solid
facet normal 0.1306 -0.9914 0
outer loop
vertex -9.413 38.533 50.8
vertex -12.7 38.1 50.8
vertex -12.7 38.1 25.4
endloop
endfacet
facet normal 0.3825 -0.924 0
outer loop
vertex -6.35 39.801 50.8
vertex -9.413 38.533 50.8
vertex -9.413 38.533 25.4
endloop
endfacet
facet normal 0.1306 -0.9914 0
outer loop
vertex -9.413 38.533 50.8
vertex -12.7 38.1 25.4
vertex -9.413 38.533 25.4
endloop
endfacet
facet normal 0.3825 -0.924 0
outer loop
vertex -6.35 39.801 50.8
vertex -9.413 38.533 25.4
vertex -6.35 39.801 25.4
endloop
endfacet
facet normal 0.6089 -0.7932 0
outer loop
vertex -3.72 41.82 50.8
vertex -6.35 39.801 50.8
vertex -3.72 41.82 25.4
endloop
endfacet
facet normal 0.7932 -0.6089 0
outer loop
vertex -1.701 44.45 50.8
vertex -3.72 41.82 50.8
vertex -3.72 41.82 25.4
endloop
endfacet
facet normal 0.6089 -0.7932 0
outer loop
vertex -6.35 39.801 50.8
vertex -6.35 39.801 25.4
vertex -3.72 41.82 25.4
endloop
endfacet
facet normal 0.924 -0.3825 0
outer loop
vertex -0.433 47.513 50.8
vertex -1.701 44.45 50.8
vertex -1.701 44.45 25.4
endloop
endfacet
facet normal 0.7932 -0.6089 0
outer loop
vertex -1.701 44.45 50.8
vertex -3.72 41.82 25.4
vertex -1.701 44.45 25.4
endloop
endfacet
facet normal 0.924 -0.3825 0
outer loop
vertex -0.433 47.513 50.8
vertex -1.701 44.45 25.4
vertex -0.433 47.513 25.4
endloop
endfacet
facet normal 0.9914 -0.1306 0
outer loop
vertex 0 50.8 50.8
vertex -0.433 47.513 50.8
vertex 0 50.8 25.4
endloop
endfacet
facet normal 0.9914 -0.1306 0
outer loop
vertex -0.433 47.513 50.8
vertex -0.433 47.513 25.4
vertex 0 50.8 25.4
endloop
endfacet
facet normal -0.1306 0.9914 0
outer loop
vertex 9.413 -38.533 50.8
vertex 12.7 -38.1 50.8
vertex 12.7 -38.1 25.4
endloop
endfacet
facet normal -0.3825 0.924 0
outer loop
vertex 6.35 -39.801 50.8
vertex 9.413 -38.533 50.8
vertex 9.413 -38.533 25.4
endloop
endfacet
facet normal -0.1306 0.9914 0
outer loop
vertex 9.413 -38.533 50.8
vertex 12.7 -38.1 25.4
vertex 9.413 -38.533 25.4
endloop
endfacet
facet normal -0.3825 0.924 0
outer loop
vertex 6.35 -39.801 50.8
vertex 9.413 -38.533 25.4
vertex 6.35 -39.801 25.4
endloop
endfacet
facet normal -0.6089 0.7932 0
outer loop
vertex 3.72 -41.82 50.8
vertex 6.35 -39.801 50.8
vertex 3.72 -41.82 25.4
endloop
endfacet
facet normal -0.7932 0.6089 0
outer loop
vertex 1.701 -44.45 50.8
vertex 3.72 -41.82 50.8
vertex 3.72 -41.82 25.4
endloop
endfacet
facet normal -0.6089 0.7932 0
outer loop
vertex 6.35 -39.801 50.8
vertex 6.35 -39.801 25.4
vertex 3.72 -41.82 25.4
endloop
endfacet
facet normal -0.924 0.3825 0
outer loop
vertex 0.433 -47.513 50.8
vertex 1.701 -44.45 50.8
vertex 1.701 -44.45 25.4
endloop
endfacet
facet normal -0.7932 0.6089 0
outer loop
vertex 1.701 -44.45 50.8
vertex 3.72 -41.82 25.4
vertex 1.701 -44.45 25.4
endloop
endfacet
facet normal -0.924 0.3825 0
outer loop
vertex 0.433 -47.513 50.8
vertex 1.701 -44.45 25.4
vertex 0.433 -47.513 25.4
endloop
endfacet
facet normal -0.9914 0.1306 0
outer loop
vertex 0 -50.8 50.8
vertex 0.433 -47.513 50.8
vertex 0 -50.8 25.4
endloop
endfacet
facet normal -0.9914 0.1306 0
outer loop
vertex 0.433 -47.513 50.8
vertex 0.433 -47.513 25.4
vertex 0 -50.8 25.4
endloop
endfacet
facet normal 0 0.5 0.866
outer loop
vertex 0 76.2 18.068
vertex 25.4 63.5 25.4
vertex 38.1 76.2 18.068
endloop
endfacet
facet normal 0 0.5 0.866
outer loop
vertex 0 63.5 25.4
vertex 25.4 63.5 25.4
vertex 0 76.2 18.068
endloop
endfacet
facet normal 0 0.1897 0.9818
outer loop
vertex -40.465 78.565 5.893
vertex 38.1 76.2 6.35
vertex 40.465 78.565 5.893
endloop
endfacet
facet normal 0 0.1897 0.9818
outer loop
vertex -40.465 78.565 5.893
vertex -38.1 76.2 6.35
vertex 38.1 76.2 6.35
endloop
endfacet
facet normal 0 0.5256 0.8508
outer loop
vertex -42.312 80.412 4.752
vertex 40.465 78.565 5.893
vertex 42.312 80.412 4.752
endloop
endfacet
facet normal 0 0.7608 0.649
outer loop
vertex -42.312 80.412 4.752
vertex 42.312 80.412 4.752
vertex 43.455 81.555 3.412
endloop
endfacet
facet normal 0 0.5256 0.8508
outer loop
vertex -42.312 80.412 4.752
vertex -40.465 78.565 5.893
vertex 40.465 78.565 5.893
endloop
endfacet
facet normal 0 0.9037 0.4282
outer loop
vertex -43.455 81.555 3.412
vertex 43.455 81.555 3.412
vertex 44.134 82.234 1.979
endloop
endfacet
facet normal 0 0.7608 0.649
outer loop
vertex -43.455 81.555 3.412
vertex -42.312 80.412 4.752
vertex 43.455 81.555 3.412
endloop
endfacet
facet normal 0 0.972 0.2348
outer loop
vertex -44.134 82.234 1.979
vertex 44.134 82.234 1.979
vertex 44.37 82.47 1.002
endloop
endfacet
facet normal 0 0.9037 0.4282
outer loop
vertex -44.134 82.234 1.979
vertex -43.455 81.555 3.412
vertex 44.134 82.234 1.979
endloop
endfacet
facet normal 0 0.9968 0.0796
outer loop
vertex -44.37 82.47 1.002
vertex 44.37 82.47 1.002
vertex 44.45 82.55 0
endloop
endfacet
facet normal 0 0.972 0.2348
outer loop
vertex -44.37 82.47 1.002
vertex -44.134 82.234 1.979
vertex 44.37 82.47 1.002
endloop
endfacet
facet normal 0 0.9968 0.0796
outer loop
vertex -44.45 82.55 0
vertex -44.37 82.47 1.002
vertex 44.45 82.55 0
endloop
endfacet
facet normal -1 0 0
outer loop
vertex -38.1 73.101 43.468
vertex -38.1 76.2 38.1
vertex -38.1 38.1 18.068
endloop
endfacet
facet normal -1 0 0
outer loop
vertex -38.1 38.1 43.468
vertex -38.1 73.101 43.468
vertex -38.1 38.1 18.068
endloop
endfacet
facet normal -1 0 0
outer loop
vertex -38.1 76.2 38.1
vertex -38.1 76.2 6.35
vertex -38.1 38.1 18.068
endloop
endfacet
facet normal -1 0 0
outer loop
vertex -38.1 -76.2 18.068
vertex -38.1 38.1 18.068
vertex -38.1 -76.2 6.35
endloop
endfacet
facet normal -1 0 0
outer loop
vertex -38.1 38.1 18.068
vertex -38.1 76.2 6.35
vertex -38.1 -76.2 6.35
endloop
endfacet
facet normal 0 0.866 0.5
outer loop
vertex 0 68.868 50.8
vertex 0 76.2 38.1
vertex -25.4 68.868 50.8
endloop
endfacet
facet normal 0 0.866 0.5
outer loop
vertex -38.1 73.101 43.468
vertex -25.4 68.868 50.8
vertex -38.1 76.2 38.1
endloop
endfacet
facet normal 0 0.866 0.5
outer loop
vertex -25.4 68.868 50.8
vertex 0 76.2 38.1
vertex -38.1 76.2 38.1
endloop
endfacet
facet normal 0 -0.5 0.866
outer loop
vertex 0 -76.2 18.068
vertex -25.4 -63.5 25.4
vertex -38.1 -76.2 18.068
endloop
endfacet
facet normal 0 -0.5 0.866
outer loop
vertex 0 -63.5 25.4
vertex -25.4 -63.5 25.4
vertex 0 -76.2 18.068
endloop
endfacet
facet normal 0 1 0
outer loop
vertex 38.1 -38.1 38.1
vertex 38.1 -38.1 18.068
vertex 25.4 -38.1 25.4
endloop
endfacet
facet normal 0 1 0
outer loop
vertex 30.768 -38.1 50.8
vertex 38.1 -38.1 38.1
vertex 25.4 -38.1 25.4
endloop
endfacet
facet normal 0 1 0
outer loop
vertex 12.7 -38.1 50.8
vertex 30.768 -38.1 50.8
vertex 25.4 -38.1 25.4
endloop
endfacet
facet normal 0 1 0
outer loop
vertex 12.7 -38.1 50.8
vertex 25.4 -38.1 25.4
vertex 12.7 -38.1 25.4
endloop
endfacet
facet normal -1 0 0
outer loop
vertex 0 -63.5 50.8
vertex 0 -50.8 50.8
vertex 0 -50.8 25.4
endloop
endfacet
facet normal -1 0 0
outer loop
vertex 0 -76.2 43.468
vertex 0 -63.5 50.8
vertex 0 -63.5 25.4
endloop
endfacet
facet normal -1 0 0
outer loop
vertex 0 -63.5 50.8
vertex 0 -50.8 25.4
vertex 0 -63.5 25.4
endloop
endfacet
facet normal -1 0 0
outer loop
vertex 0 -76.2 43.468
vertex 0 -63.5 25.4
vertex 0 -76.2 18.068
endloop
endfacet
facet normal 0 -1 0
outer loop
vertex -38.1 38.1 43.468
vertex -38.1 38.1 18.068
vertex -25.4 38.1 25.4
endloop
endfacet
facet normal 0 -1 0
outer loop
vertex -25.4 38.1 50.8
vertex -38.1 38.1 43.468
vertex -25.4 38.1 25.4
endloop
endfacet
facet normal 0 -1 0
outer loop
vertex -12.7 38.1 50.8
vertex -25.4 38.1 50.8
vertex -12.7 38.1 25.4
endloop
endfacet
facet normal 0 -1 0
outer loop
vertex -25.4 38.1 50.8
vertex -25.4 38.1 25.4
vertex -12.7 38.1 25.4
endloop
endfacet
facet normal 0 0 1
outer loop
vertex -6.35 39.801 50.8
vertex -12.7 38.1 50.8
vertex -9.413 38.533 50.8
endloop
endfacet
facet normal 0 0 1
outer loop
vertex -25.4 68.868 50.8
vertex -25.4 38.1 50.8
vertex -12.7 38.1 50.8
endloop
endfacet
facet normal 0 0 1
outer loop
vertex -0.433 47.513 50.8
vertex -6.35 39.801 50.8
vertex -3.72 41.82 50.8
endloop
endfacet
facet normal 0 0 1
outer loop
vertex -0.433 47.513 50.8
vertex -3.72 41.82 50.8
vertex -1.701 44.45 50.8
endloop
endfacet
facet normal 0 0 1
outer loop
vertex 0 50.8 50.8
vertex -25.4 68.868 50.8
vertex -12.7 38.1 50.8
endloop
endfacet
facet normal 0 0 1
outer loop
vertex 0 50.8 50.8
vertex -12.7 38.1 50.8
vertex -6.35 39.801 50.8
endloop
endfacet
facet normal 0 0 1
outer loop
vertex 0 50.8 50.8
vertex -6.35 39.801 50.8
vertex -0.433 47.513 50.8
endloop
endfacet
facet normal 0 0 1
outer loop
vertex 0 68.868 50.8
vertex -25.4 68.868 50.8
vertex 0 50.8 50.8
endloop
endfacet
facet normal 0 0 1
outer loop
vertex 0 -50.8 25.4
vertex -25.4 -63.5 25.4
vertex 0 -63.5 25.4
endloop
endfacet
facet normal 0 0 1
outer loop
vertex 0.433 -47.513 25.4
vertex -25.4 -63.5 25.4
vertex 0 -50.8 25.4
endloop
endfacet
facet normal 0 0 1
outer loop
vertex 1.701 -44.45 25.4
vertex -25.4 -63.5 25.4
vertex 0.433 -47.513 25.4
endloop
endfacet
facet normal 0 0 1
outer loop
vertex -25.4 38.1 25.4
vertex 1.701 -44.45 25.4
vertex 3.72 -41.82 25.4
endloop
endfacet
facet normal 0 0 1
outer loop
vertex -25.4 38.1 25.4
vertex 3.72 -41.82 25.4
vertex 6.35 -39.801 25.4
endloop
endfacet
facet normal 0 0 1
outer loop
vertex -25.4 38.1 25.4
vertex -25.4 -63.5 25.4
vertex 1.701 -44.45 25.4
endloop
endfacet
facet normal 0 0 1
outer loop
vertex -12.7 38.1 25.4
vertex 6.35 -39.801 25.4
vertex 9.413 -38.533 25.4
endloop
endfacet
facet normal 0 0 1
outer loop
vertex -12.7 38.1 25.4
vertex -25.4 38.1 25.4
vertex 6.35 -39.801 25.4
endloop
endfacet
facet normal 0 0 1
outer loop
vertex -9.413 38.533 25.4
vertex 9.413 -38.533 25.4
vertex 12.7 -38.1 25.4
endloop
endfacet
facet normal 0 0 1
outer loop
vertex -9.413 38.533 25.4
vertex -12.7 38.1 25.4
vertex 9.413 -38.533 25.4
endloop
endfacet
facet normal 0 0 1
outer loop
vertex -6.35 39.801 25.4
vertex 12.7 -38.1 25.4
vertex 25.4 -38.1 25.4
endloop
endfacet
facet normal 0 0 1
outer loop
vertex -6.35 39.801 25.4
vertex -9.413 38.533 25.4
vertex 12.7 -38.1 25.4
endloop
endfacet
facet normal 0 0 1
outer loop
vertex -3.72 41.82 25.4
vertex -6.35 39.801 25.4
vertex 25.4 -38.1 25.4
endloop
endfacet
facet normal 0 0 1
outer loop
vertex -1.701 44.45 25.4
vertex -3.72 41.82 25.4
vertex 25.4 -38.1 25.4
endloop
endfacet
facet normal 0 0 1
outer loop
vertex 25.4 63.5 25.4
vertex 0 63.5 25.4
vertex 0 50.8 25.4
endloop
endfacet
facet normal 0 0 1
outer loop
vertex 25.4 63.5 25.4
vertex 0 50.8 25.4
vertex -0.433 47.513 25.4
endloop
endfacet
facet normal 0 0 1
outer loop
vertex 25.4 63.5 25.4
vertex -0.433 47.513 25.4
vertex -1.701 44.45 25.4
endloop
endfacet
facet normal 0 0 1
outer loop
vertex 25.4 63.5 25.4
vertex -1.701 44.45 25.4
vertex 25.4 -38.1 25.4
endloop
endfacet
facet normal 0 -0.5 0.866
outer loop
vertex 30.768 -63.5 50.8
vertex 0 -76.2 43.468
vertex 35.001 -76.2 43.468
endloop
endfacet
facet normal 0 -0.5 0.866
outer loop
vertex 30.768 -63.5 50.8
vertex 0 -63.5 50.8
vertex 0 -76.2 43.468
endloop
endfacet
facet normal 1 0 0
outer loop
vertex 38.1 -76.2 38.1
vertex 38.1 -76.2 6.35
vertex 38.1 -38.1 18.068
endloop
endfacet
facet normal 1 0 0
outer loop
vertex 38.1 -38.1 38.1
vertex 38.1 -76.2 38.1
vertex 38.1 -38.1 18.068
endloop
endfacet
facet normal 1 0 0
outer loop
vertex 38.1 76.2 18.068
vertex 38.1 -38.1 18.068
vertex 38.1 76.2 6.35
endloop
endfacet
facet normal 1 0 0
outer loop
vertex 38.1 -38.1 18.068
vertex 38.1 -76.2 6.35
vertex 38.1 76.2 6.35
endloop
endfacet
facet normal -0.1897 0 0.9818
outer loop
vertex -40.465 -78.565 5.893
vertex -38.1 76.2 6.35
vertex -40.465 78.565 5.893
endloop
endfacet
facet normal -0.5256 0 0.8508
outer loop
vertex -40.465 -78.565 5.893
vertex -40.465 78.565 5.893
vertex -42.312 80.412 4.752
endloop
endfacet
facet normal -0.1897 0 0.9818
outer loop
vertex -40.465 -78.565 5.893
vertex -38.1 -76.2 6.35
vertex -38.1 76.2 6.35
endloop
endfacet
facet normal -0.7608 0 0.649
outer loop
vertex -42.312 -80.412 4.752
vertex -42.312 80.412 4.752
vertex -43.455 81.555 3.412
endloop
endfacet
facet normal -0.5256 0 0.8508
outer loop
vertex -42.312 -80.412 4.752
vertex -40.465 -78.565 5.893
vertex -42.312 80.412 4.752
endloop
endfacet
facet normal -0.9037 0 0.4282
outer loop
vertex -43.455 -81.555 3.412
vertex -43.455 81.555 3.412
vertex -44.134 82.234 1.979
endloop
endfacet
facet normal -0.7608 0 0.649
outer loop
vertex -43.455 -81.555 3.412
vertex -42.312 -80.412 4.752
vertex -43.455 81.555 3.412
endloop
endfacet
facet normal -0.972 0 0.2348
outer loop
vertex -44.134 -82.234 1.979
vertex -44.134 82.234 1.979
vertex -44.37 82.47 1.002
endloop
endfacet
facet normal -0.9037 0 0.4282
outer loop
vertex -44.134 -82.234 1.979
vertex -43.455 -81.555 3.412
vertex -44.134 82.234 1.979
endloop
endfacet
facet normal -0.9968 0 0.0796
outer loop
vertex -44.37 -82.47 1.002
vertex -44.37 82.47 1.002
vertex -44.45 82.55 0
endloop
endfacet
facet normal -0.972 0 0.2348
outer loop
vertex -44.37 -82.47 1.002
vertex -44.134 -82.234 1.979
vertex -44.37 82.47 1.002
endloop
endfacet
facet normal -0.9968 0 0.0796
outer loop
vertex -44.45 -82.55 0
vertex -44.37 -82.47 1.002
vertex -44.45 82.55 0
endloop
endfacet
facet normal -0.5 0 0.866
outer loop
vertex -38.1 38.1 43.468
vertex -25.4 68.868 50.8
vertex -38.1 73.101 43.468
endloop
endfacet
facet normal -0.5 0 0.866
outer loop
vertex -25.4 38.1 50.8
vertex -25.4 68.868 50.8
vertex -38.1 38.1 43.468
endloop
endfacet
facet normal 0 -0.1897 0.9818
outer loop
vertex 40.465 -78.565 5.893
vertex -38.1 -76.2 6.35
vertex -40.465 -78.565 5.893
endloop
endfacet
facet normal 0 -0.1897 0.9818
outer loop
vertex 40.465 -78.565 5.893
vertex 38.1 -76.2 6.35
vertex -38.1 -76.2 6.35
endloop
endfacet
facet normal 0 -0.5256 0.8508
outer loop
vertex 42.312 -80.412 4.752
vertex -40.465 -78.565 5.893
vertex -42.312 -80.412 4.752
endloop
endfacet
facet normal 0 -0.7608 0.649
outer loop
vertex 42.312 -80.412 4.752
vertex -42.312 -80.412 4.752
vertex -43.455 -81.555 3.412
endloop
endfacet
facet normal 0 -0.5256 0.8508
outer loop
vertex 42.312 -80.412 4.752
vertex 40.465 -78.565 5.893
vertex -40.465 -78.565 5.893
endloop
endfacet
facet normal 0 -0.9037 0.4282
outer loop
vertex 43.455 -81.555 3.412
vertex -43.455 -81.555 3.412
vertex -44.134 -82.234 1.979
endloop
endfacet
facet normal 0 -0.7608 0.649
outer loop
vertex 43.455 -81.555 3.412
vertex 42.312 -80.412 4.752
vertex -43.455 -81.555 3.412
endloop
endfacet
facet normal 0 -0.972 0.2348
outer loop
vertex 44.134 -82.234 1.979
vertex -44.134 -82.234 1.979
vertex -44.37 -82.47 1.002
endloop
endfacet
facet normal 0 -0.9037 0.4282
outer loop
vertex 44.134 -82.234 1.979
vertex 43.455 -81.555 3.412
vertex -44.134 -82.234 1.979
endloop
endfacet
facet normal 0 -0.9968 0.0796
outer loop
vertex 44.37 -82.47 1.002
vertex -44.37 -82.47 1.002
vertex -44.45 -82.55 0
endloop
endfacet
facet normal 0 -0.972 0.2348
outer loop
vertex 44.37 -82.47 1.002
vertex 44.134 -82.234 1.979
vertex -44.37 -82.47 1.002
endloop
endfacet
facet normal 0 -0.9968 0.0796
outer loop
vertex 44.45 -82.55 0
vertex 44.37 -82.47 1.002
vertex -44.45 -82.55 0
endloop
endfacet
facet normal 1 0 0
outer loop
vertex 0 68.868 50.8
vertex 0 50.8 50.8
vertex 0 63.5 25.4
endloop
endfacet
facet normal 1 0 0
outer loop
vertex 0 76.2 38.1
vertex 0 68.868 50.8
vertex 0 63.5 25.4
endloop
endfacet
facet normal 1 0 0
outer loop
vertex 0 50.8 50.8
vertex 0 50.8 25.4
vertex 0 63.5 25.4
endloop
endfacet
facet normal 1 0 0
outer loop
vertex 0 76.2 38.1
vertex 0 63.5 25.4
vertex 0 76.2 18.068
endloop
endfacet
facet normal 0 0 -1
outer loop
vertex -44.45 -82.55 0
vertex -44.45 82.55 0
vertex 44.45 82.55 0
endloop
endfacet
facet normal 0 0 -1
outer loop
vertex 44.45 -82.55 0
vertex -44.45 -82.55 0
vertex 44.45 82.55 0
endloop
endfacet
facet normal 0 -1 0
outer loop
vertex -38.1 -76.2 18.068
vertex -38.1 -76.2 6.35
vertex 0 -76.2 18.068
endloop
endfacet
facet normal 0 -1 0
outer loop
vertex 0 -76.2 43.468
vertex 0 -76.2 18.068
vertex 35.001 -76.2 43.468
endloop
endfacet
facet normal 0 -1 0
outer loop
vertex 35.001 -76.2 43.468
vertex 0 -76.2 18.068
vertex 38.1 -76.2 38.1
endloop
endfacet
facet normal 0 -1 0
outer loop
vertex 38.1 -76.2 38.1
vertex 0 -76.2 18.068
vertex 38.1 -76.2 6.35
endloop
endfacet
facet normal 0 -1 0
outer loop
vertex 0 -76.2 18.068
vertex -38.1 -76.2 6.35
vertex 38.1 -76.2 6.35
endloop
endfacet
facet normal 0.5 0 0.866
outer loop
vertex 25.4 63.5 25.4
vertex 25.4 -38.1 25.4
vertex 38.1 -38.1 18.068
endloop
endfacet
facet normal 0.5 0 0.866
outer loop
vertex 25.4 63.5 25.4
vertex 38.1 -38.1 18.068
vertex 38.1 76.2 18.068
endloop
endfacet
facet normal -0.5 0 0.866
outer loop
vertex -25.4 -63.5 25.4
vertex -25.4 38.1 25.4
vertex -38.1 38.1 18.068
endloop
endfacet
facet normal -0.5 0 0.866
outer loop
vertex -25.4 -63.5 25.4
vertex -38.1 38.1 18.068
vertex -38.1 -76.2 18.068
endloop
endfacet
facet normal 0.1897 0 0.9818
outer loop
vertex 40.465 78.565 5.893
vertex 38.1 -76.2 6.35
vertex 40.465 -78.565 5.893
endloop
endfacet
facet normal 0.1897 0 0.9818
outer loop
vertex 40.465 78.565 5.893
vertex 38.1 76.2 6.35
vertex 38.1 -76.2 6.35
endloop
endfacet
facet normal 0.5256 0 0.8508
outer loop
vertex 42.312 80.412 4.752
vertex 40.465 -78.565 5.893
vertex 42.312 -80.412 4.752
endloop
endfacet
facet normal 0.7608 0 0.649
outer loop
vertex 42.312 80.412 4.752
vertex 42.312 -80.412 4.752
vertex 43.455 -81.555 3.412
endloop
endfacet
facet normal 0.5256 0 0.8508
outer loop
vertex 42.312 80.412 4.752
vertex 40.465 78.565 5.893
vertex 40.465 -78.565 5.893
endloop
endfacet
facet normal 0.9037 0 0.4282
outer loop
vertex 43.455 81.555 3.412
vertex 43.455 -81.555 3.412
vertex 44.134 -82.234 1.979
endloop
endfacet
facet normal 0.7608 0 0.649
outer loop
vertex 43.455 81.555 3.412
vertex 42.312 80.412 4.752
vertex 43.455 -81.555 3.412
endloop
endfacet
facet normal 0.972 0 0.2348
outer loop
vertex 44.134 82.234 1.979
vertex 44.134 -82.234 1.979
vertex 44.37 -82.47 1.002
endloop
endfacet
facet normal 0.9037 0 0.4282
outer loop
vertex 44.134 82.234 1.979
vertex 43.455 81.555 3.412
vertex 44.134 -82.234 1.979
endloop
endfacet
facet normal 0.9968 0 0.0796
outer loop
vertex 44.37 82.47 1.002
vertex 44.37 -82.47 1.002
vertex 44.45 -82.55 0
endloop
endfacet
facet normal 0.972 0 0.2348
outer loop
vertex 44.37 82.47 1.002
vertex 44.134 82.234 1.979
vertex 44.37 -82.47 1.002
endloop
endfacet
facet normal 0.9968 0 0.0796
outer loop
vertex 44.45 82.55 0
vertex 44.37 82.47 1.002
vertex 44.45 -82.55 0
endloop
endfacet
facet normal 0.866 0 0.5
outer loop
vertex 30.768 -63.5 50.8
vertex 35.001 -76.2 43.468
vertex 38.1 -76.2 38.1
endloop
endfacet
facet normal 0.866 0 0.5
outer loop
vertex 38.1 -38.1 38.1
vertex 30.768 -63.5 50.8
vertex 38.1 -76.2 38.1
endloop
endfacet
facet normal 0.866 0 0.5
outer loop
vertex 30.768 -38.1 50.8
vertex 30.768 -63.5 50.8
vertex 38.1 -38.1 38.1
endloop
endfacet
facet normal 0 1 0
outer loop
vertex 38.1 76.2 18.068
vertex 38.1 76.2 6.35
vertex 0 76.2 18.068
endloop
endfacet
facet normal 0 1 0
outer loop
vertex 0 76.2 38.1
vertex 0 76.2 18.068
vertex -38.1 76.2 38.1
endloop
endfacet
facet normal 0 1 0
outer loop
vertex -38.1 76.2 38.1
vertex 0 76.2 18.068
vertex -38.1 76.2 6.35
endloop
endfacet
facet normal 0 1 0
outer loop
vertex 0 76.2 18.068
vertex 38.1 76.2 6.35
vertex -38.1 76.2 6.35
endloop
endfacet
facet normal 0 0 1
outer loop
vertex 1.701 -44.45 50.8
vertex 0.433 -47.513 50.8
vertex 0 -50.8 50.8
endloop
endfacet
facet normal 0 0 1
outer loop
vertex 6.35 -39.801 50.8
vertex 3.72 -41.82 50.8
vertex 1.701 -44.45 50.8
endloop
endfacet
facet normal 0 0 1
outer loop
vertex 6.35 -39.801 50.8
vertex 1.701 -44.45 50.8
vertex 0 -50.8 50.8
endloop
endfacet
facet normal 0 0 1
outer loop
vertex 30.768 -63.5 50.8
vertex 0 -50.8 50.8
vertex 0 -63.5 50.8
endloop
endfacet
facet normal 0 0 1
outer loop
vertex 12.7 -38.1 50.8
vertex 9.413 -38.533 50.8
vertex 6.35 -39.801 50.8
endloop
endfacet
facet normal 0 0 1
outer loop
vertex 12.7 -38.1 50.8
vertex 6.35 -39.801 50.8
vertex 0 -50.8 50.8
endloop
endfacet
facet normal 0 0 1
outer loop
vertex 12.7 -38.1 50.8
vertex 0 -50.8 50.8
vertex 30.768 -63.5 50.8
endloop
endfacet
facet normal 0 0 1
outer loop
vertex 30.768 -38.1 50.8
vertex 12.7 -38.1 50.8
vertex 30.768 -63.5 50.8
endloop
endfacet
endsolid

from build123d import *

# Parameters (mm, degrees)
F1_DEPTH    = 6.35
F2_DEPTH    = 25.4
F3_DEPTH    = 50.8
F4_C1_SIZE2 = 12.7
F4_C1_SIZE  = 7.3323484187
F4_C2_SIZE2 = 12.7
F4_C2_SIZE  = 7.3323484187
F4_C3_SIZE2 = 7.3323484187
F4_C3_SIZE  = 12.7
F4_C4_SIZE2 = 12.7
F4_C4_SIZE  = 7.3323484187
F4_C5_SIZE2 = 12.7
F4_C5_SIZE  = 7.3323484187
F4_C6_SIZE2 = 12.7
F4_C6_SIZE  = 7.3323484187
F4_C7_SIZE2 = 12.7
F4_C7_SIZE  = 7.3323484187
F4_C8_SIZE2 = 12.7
F4_C8_SIZE  = 7.3323484187
F5_R        = 6.34999


# Not quite as in the source:
# - a fillet or chamfer is up to 0.001 mm smaller than in the source, because OpenCascade refuses the exact size


with BuildPart() as f1:
    # F0 (on Top) → F1 (new body)
    with BuildSketch(Plane.XY):
        Polygon((-38.1, 38.1), (-38.1, 76.2), (0, 76.2), (38.1, 76.2), (38.1, 82.55), (-44.45, 82.55), (-44.45, -82.55), (-38.1, -82.55), (-38.1, -76.2), align=None)
        Polygon((38.1, 82.55), (38.1, 76.2), (38.1, -38.1), (38.1, -76.2), (0, -76.2), (-38.1, -76.2), (-38.1, -82.55), (44.45, -82.55), (44.45, 82.55), align=None)
    extrude(amount=F1_DEPTH)

    # F0 (on Top) → F2 (join)
    with BuildSketch(Plane.XY):
        with BuildLine():
            Line((38.1, 76.2), (0, 76.2))
            Line((0, 76.2), (0, 50.8))
            ThreePointArc((0, 50.8), (-3.7197438789, 41.8197438789), (-12.7, 38.1))
            Line((-12.7, 38.1), (-38.1, 38.1))
            Line((-38.1, 38.1), (-38.1, -76.2))
            Line((-38.1, -76.2), (0, -76.2))
            Line((0, -76.2), (0, -50.8))
            ThreePointArc((0, -50.8), (3.7197438789, -41.8197438789), (12.7, -38.1))
            Line((12.7, -38.1), (38.1, -38.1))
            Line((38.1, -38.1), (38.1, 76.2))
        make_face()
    extrude(amount=F2_DEPTH)

    # F0 (on Top) → F3 (join)
    with BuildSketch(Plane.XY):
        with BuildLine():
            Line((0, 76.2), (-38.1, 76.2))
            Line((-38.1, 76.2), (-38.1, 38.1))
            Line((-38.1, 38.1), (-12.7, 38.1))
            ThreePointArc((-12.7, 38.1), (-3.7197438789, 41.8197438789), (0, 50.8))
            Line((0, 50.8), (0, 76.2))
        make_face()
        with BuildLine():
            Line((38.1, -76.2), (38.1, -38.1))
            Line((38.1, -38.1), (12.7, -38.1))
            ThreePointArc((12.7, -38.1), (3.7197438789, -41.8197438789), (0, -50.8))
            Line((0, -50.8), (0, -76.2))
            Line((0, -76.2), (38.1, -76.2))
        make_face()
    extrude(amount=F3_DEPTH)

    # F4: chamfer of 12.7 x 7.3323484187 on 8 edges, made by hand

    # F4_c1
    f4_c1_edges = [f1.edges().sort_by_distance(p)[0] for p in [
        (-19.05, -76.2, 25.4),
    ]]
    f4_c1_side = f1.faces().sort_by_distance((-19.05, -76.2, 25.2533530316))[0]
    chamfer(f4_c1_edges, length=F4_C1_SIZE, length2=F4_C1_SIZE2, reference=f4_c1_side)

    # F4_c2
    f4_c2_edges = [f1.edges().sort_by_distance(p)[0] for p in [
        (19.05, -76.2, 50.8),
    ]]
    f4_c2_side = f1.faces().sort_by_distance((19.05, -76.2, 50.6533530316))[0]
    chamfer(f4_c2_edges, length=F4_C2_SIZE, length2=F4_C2_SIZE2, reference=f4_c2_side)

    # F4_c3
    f4_c3_edges = [f1.edges().sort_by_distance(p)[0] for p in [
        (38.1, -50.8, 50.8),
    ]]
    f4_c3_side = f1.faces().sort_by_distance((38.1, -50.8, 50.6533530316))[0]
    chamfer(f4_c3_edges, length=F4_C3_SIZE, length2=F4_C3_SIZE2, reference=f4_c3_side)

    # F4_c4
    f4_c4_edges = [f1.edges().sort_by_distance(p)[0] for p in [
        (38.1, 19.05, 25.4),
    ]]
    f4_c4_side = f1.faces().sort_by_distance((38.1, 19.05, 25.2533530316))[0]
    chamfer(f4_c4_edges, length=F4_C4_SIZE, length2=F4_C4_SIZE2, reference=f4_c4_side)

    # F4_c5
    f4_c5_edges = [f1.edges().sort_by_distance(p)[0] for p in [
        (12.7, 76.2, 25.4),
    ]]
    f4_c5_side = f1.faces().sort_by_distance((12.7, 76.2, 25.2533530316))[0]
    chamfer(f4_c5_edges, length=F4_C5_SIZE, length2=F4_C5_SIZE2, reference=f4_c5_side)

    # F4_c6
    f4_c6_edges = [f1.edges().sort_by_distance(p)[0] for p in [
        (-38.1, -12.7, 25.4),
    ]]
    f4_c6_side = f1.faces().sort_by_distance((-38.1, -12.7, 25.2533530316))[0]
    chamfer(f4_c6_edges, length=F4_C6_SIZE, length2=F4_C6_SIZE2, reference=f4_c6_side)

    # F4_c7
    f4_c7_edges = [f1.edges().sort_by_distance(p)[0] for p in [
        (-19.05, 76.2, 50.8),
    ]]
    f4_c7_side = f1.faces().sort_by_distance((-19.05, 76.0533530316, 50.8))[0]
    chamfer(f4_c7_edges, length=F4_C7_SIZE, length2=F4_C7_SIZE2, reference=f4_c7_side)

    # F4_c8
    f4_c8_edges = [f1.edges().sort_by_distance(p)[0] for p in [
        (-38.1, 53.4838257906, 50.8),
    ]]
    f4_c8_side = f1.faces().sort_by_distance((-38.1, 53.4838257906, 50.6533530316))[0]
    chamfer(f4_c8_edges, length=F4_C8_SIZE, length2=F4_C8_SIZE2, reference=f4_c8_side)

    # F5 (radius 6.35 in the source; OpenCascade refuses exactly that, so slightly less here)
    f5_edges = [f1.edges().sort_by_distance(p)[0] for p in [
        (-44.45, 0, 6.35),
        (0, 82.55, 6.35),
        (44.45, 0, 6.35),
        (0, -82.55, 6.35),
    ]]
    fillet(f5_edges, radius=F5_R)


solid = f1.part
